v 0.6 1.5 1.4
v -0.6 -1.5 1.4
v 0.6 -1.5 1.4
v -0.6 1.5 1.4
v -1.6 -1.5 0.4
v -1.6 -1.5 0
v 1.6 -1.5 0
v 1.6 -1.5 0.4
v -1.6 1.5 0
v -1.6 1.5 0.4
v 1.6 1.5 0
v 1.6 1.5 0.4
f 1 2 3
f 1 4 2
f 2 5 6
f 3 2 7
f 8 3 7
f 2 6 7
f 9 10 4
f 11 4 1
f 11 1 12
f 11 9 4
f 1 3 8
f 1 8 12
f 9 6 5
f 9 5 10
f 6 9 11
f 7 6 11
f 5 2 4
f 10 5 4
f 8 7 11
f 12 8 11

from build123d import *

# Parameters (mm, degrees)
SKETCH_W     = 3.2
SKETCH_H     = 3
PAD_DEPTH    = 1.4
CHAMFER_SIZE = 1


with BuildPart() as part:
    # Sketch → Pad (new body)
    with BuildSketch(Plane.XY):
        Rectangle(SKETCH_W, SKETCH_H)
    extrude(amount=PAD_DEPTH)

    # Chamfer
    chamfer_edges = [part.edges().sort_by_distance(p)[0] for p in [
        (-1.6, 0, 1.4),
        (1.6, 0, 1.4),
    ]]
    chamfer(chamfer_edges, length=CHAMFER_SIZE)


solid = part.part
